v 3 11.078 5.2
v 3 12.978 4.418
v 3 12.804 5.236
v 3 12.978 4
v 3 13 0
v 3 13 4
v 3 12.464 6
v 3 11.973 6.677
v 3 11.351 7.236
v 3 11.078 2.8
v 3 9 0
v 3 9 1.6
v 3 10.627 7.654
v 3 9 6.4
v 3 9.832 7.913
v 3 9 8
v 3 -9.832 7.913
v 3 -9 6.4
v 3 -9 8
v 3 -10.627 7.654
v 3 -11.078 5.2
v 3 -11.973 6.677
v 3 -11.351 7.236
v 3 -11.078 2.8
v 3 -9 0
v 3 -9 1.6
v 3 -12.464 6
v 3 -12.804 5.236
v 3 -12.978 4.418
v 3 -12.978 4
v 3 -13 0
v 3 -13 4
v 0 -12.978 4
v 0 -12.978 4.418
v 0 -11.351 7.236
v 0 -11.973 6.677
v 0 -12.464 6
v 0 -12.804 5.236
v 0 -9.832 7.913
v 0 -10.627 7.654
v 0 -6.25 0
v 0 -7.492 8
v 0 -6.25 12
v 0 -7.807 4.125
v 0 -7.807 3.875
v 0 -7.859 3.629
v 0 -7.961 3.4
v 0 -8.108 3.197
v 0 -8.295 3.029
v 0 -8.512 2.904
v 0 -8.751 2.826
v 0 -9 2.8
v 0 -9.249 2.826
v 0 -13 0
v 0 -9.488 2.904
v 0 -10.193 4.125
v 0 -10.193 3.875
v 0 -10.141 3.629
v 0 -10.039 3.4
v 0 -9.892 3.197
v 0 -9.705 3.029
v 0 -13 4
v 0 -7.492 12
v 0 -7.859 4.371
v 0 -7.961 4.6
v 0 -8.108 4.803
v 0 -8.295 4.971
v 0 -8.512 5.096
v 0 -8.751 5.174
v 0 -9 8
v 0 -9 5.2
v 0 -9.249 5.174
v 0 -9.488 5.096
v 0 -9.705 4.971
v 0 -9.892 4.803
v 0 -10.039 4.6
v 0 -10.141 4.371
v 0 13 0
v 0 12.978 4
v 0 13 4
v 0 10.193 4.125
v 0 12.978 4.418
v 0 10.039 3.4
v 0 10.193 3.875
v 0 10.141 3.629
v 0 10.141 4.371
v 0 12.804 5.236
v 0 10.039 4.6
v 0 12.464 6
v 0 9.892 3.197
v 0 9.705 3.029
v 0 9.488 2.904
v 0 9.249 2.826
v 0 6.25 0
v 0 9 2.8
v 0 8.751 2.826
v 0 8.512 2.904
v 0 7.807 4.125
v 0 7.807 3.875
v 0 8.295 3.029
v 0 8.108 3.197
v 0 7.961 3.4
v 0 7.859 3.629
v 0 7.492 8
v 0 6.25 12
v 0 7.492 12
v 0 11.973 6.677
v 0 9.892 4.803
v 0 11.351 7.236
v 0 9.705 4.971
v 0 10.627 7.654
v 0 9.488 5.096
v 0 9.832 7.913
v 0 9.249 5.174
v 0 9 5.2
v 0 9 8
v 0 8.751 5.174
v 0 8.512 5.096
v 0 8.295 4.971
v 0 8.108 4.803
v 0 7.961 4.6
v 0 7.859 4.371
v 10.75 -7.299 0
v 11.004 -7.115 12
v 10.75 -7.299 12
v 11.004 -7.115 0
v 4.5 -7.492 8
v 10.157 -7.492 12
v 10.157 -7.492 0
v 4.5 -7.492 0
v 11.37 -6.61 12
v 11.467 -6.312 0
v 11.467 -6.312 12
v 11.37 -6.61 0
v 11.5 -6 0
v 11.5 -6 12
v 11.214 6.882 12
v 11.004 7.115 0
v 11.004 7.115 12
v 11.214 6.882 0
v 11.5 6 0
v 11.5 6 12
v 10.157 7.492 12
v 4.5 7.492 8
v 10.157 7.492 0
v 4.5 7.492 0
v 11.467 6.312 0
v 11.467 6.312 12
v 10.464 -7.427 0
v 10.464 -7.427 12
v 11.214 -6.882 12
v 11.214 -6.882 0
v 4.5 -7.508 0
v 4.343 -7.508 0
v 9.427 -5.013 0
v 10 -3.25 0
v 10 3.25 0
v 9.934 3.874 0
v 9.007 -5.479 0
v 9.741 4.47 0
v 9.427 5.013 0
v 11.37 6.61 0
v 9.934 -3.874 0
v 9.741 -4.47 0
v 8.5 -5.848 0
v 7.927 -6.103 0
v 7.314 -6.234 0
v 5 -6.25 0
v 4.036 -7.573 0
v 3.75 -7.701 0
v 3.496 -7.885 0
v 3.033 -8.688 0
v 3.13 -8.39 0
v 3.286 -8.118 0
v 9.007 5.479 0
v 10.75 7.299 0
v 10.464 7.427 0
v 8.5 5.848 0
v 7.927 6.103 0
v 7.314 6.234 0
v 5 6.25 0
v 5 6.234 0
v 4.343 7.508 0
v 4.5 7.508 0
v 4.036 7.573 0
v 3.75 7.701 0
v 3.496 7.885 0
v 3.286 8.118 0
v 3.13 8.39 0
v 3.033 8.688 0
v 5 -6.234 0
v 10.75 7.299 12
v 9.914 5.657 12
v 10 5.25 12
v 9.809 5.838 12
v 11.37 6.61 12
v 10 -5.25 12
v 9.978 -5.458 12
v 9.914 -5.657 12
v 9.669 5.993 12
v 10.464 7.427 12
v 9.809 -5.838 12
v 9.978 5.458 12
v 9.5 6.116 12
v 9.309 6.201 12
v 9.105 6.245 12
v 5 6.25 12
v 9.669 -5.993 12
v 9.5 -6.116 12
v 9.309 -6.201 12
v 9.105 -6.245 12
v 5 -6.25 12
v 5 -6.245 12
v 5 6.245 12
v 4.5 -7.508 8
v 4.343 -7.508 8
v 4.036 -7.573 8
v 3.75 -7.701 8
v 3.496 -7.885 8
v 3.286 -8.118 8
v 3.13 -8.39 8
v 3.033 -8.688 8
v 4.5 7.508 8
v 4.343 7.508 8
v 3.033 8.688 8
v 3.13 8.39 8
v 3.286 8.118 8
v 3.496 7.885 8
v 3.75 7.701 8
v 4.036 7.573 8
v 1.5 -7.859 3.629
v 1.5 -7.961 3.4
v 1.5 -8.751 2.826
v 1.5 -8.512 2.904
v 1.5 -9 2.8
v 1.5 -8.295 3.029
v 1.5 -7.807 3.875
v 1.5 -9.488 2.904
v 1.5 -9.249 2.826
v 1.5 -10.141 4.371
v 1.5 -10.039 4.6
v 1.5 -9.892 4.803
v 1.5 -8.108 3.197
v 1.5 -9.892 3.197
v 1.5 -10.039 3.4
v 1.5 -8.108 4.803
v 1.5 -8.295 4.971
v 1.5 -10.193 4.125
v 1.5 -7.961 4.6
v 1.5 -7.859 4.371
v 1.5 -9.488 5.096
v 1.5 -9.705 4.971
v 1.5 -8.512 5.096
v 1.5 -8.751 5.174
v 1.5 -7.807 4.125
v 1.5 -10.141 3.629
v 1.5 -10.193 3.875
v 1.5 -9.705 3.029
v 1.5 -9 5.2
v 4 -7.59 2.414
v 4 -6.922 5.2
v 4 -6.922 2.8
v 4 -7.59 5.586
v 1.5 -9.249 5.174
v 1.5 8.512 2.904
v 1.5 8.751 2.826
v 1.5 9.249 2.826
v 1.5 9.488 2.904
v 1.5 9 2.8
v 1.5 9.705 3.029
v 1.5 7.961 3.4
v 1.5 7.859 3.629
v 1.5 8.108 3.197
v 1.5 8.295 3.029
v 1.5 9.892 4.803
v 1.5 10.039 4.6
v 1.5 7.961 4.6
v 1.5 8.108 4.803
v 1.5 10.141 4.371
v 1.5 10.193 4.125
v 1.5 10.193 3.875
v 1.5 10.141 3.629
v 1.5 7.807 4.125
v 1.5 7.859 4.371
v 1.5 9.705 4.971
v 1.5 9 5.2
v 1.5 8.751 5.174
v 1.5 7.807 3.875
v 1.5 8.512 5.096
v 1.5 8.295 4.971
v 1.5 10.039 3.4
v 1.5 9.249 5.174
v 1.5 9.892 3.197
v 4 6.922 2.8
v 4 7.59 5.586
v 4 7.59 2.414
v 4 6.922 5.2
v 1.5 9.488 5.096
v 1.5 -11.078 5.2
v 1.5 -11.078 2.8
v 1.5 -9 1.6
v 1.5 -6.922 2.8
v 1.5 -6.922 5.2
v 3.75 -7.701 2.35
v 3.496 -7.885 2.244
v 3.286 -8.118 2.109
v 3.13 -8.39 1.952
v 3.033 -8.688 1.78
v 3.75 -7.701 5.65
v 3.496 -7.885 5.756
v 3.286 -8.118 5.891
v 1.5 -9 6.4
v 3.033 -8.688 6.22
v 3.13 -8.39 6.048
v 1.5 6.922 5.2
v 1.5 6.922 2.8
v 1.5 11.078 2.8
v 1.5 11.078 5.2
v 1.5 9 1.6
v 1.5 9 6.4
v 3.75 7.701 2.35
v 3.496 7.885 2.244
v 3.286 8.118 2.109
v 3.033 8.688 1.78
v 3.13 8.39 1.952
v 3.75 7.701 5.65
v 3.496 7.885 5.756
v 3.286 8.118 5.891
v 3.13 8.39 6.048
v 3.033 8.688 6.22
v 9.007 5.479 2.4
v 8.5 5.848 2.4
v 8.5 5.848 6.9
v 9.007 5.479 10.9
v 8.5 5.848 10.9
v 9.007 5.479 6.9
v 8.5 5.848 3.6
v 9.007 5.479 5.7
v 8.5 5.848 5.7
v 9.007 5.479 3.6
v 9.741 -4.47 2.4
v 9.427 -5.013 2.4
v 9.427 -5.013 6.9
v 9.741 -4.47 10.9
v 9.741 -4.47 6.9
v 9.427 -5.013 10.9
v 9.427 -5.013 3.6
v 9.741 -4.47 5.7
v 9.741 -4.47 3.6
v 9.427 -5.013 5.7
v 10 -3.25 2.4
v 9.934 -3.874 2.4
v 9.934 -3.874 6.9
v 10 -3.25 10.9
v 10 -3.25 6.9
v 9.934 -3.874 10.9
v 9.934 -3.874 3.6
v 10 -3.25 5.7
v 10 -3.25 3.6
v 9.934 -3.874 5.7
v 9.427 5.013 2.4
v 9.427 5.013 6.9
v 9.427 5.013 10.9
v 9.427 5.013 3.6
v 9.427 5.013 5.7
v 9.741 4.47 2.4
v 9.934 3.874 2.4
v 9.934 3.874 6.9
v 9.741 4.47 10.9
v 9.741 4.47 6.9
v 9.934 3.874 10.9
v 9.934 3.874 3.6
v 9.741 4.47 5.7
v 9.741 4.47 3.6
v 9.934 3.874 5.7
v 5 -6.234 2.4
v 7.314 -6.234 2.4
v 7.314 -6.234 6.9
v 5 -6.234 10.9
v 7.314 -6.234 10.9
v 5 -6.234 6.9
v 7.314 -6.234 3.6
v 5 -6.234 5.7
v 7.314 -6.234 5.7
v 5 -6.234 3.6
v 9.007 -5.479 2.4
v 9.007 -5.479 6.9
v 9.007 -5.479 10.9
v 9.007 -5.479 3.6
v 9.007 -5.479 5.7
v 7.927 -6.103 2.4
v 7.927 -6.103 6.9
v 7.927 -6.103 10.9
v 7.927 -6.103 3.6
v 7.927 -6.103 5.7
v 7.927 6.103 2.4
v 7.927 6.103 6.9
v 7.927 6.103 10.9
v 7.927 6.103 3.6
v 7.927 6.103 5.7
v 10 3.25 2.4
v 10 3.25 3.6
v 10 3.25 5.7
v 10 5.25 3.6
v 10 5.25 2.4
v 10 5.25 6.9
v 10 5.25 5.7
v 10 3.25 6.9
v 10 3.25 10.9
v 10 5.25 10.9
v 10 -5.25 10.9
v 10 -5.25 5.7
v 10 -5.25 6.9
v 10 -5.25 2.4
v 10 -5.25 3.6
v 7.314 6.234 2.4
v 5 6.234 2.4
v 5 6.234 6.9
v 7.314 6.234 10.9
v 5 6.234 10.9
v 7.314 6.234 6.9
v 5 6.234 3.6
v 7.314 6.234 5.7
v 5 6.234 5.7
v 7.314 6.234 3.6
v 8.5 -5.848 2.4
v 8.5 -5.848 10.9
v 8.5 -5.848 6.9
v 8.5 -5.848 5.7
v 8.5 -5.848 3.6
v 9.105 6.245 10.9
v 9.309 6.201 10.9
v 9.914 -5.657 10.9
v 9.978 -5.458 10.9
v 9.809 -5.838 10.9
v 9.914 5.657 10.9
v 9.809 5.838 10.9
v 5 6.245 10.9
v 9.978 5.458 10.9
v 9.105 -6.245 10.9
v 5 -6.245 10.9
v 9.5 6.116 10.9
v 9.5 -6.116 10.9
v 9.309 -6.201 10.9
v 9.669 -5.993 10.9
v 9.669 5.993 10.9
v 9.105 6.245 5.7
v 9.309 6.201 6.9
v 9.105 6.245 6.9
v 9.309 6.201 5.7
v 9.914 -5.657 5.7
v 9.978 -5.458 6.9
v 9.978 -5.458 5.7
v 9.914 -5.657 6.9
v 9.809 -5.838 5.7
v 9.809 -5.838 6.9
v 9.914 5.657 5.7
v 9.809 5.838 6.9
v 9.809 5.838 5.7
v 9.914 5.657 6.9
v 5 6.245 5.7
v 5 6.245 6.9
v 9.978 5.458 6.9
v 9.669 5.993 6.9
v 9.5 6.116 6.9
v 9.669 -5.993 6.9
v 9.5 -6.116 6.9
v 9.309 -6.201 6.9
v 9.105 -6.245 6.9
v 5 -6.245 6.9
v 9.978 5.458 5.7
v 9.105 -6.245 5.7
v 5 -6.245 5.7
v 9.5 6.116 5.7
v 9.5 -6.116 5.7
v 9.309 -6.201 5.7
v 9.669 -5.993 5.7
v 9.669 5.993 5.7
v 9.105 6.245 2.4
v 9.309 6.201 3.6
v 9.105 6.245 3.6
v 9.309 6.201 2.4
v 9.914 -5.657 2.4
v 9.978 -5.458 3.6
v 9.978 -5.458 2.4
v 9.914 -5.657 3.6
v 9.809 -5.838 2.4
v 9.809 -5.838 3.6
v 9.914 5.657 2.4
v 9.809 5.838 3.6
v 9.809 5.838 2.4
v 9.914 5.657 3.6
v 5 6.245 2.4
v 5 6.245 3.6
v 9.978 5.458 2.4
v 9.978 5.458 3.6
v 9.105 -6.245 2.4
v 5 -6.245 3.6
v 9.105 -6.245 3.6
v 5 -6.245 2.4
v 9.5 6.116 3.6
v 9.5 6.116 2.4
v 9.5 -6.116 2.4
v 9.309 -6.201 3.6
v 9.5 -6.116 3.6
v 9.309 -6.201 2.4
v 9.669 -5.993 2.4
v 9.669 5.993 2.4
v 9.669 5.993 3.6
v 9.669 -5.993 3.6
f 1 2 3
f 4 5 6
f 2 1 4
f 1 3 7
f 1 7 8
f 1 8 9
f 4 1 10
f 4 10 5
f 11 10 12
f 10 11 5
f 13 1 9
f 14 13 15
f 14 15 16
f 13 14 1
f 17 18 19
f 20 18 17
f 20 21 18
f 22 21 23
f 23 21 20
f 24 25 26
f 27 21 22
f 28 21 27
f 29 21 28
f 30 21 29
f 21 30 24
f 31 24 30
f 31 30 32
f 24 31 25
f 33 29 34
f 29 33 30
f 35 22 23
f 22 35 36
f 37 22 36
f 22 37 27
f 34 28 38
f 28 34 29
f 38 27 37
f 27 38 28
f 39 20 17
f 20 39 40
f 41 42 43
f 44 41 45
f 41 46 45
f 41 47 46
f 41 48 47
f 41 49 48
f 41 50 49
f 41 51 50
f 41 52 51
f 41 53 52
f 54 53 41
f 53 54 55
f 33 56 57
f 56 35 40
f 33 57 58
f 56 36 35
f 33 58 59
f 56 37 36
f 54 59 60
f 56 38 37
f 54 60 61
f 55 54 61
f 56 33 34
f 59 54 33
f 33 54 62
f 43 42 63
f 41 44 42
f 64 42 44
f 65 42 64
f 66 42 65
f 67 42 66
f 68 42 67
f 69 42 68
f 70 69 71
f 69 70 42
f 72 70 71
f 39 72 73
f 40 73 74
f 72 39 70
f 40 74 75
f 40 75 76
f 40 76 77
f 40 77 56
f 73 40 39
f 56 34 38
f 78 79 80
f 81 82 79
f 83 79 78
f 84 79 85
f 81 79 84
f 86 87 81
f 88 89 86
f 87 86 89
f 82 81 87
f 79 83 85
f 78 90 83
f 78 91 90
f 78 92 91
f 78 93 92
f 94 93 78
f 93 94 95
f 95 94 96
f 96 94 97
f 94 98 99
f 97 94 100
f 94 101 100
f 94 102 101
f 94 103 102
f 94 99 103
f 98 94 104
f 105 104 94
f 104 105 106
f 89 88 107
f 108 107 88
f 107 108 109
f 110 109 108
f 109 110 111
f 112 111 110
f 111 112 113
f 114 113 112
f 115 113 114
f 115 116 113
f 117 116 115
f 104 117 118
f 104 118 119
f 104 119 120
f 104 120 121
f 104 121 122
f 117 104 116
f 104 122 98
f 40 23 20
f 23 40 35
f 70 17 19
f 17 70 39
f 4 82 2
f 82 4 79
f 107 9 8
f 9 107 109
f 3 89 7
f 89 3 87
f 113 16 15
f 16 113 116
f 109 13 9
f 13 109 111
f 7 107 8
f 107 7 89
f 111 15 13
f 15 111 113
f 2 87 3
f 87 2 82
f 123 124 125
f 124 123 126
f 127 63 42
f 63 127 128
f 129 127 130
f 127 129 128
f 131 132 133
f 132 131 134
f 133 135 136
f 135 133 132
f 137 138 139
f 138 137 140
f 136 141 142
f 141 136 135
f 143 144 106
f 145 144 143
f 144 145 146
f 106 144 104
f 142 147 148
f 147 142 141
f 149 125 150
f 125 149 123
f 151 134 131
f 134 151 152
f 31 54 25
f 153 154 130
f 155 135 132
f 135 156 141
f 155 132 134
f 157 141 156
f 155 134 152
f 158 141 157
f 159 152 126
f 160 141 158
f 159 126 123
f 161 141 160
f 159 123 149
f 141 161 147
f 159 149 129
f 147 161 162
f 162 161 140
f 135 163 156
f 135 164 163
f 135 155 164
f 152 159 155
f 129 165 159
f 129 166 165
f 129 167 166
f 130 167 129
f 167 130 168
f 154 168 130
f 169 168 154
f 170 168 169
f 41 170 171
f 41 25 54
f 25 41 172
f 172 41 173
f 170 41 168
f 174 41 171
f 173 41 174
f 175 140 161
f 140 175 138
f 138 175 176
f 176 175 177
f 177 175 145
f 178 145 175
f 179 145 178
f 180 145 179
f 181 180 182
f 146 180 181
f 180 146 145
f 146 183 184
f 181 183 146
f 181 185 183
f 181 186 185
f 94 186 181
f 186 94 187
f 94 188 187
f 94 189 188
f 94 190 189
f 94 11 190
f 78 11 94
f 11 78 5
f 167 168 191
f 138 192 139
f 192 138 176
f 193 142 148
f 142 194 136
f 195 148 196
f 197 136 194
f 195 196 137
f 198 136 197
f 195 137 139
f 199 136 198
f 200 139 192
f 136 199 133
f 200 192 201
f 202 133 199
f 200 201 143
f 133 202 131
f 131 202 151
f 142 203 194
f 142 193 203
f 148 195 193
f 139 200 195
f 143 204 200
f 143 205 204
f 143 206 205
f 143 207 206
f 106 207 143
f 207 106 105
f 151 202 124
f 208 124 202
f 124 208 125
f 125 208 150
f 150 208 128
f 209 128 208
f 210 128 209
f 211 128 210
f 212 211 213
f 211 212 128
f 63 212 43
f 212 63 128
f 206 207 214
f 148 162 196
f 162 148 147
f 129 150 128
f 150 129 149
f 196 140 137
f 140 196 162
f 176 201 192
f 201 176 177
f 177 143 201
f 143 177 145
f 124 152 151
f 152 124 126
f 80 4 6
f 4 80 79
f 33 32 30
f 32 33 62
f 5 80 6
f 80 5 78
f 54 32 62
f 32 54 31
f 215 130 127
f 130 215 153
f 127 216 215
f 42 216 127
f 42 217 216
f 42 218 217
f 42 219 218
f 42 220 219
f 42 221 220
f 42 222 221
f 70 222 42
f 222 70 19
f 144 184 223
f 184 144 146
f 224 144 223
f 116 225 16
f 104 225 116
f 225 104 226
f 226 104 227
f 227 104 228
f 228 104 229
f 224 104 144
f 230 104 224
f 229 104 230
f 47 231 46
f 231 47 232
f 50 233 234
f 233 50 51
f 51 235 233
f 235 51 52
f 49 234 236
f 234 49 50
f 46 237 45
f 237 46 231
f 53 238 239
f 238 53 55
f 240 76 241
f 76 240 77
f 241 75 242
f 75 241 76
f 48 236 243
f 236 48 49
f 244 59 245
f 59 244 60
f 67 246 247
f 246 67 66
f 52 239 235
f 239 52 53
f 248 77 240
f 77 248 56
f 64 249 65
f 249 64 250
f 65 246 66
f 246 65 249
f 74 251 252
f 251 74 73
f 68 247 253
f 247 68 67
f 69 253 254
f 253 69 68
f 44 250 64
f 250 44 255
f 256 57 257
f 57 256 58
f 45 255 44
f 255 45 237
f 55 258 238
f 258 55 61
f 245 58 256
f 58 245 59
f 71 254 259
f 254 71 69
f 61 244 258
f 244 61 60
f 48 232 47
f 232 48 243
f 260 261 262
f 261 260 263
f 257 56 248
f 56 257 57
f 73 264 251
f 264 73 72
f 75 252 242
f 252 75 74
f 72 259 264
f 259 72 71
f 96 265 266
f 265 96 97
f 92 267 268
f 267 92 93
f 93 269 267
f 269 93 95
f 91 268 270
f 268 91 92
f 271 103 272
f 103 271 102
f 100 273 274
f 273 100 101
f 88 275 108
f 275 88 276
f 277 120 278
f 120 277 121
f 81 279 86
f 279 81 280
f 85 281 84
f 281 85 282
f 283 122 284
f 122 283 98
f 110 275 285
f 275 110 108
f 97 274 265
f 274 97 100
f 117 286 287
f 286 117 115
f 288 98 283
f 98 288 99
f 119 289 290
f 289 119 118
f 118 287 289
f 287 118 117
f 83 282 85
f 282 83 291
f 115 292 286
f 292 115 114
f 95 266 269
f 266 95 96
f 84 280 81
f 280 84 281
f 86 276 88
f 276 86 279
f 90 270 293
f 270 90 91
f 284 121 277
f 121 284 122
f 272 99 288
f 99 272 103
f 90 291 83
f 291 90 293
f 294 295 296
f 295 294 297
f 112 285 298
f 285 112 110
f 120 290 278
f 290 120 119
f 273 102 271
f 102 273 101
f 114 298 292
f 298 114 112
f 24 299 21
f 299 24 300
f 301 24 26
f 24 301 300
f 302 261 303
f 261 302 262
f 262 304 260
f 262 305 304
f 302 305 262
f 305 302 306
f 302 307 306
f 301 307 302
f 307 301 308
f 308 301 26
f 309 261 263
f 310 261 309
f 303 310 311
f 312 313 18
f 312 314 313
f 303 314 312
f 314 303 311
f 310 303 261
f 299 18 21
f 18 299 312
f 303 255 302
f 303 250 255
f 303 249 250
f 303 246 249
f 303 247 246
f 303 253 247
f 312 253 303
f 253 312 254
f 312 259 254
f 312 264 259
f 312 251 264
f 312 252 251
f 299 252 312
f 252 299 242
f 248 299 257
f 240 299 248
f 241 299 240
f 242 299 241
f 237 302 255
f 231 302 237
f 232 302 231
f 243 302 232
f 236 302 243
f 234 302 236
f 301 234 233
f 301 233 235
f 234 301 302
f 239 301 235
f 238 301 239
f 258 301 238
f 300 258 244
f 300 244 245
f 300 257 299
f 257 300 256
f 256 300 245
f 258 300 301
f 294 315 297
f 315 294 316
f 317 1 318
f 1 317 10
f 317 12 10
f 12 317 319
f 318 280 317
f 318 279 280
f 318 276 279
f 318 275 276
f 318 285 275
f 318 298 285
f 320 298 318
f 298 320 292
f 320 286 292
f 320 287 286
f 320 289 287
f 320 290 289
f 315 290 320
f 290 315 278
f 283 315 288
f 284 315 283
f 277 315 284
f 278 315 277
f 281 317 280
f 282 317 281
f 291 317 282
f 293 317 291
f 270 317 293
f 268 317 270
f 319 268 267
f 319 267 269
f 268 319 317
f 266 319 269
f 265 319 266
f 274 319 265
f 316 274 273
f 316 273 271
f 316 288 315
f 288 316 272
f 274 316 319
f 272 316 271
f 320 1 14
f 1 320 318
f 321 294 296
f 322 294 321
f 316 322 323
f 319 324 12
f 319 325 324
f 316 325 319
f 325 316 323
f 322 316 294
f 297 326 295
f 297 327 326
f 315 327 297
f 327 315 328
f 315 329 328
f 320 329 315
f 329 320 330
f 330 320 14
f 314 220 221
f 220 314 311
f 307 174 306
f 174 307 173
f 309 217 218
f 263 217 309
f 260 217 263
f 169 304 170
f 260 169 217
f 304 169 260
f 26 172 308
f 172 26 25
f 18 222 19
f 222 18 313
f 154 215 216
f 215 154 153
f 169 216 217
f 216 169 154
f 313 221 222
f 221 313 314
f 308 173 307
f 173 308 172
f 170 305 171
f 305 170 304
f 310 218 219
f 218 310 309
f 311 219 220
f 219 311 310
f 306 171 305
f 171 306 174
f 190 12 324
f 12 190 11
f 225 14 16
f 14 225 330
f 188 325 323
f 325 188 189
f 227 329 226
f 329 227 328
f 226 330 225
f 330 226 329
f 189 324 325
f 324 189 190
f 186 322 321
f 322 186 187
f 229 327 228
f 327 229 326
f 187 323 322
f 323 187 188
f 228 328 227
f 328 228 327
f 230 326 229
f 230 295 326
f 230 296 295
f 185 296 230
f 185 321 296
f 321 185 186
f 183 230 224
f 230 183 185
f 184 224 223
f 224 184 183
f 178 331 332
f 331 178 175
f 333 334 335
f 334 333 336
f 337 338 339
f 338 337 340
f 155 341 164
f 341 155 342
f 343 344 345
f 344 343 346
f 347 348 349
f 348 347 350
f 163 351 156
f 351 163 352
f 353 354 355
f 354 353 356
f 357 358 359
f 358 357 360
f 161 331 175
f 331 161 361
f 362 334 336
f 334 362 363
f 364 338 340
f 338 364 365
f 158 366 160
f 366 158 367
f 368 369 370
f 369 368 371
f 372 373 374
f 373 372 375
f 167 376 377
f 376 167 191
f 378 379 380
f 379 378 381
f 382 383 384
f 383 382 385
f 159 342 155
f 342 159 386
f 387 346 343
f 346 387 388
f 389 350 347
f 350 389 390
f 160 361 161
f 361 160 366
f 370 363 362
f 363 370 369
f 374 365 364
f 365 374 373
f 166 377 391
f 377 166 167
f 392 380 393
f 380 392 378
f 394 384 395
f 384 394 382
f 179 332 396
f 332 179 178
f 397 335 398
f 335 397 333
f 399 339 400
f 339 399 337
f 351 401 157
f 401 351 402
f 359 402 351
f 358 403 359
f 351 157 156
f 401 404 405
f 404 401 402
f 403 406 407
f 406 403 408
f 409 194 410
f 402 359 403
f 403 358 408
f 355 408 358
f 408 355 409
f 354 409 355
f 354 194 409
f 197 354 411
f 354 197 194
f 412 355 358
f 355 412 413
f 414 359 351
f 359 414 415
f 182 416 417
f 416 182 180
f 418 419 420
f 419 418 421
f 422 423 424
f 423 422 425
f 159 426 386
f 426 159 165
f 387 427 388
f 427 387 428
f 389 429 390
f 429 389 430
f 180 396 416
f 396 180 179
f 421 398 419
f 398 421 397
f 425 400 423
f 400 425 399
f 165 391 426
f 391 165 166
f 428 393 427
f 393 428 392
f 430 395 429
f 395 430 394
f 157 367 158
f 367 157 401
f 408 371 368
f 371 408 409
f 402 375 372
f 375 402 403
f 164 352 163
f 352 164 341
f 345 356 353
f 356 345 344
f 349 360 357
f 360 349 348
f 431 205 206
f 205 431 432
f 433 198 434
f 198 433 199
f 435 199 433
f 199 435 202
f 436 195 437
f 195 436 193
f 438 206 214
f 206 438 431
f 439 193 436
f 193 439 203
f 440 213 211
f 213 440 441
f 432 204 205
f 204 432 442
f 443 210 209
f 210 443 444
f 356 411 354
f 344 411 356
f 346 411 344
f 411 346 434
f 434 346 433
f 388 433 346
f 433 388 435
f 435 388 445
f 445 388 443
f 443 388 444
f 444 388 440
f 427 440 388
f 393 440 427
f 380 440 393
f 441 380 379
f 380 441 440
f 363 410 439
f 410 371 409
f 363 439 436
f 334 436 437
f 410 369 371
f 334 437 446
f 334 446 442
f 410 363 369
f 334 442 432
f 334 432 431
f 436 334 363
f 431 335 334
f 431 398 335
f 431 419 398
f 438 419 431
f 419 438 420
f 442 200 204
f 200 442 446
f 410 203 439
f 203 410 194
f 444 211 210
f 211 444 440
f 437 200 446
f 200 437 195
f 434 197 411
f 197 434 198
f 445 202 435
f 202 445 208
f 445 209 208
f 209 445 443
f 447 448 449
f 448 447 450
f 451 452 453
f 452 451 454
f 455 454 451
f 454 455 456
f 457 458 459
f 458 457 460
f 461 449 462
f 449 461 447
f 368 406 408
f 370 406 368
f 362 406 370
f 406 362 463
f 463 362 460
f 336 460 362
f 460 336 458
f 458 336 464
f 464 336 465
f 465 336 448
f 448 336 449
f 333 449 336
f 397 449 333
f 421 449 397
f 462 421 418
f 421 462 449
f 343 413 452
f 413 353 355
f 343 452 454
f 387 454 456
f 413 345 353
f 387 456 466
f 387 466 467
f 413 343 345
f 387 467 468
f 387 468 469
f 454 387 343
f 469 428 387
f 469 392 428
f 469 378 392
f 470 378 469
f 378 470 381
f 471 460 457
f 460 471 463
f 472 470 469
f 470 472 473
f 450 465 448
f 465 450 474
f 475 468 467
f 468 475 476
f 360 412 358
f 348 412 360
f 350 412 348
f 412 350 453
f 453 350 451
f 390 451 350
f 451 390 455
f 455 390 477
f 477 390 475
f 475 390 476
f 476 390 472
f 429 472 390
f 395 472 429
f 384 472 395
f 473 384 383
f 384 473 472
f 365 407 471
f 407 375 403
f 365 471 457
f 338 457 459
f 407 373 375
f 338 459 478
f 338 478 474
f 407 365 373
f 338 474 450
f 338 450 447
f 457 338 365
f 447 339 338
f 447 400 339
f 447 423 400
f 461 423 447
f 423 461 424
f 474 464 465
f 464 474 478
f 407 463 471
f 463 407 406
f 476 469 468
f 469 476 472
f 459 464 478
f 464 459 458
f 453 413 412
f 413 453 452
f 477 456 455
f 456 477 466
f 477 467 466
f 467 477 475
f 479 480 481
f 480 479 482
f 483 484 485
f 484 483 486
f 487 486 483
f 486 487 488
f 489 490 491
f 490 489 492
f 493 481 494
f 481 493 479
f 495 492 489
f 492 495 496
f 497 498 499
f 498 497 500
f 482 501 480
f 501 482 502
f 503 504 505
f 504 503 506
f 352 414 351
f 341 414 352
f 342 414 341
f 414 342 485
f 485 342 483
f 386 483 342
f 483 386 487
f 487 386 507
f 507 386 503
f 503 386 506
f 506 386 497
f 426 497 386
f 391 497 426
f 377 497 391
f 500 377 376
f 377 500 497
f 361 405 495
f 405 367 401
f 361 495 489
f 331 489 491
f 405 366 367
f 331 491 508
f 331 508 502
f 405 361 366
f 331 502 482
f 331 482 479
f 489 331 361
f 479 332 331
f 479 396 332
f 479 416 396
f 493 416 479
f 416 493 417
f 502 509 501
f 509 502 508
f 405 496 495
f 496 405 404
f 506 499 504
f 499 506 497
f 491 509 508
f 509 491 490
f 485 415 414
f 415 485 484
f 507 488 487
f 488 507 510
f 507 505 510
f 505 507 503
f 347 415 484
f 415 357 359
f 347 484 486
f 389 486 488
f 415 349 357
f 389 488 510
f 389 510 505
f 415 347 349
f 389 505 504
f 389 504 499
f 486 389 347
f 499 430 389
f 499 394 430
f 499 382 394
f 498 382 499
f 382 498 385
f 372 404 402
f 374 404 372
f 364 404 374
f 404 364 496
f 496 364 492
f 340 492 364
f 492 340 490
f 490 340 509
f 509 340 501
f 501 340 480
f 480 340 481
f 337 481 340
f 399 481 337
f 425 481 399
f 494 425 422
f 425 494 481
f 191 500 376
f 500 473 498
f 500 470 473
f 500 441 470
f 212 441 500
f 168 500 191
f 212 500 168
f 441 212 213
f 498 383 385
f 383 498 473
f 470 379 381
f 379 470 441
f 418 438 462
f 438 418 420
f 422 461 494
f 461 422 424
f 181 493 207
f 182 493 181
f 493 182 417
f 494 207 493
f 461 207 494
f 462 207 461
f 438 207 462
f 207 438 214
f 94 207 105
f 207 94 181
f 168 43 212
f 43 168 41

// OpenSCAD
//Bracket for 12mm Micro Motor with Metal Gearbox.
//Oktay Gülmez, 19/02/2016.
//GNU GPL.

//parameters:
//Bracket lenght (10-20mm.)
lenght=12; 
//(Diagonal size of the nuts; small=4,4mm. or large=5,2mm.)
nuts=4.4; 

$fn=30;
module inside(){
    difference(){
        union(){
            translate([10,0,4]) rotate([0,90,0]) minkowski(){
                cube([6,6.5,30], center=true);
                cylinder(r=3);
            }
          
        }
       
    }
}

module plate(){
    difference(){
        union(){
            translate([0,0,4]) rotate([0,90,0]) minkowski(){
                cube([10,10.5,0.2], center=true);
                cylinder(r=1);
            }
          
        }
       
    }
}
    
module bracket(){    
difference(){
    union(){
        translate([lenght-4,-9,0]) cylinder(h=3, r=4);
        translate([lenght-4,9,0]) cylinder(h=3, r=4);
        
        translate([lenght/2-0.5,0,4]) rotate([0,90,0]) minkowski(){
             cube([12,12,lenght-1], center=true);
            cylinder(r=1.5);
        }
        
        translate([lenght-4,-9-4,0]) cube([4,18+8,3]);
        
        translate([lenght-8,-9,0]) cube([8,3,4.5]);
        translate([lenght-8,9-3,0]) cube([8,3,4.5]);
        
    }
    translate([lenght-4,-9,-1]) cylinder(h=5, r=1.2);
        translate([lenght-4,9,-1]) cylinder(h=5, r=1.2);
    translate([lenght-4,-9,1.5]) cylinder(h=2.5, r=nuts/2+0.2, $fn=6);
        translate([lenght-4,9,1.5]) cylinder(h=2.5, r=nuts/2+0.2, $fn=6);
    
    translate([lenght-8-1,-9,4.5]) rotate([0,90,0]) cylinder(h=10, r=1.5);
    translate([lenght-8-1,9,4.5]) rotate([0,90,0]) cylinder(h=10, r=1.5);
    
    inside();
    translate([0,0,0]) plate();
    translate([5.2,0,0]) plate();
     translate([8.5,0,0]) plate();
    
    translate([lenght/2,0,0]) cube([lenght+2,12.5,10], center=true);
    
    translate([-1,-15,-5]) cube([lenght+2,30,5]);
        
}
}

translate([0,0,lenght]) rotate([0,90,0]) bracket();

